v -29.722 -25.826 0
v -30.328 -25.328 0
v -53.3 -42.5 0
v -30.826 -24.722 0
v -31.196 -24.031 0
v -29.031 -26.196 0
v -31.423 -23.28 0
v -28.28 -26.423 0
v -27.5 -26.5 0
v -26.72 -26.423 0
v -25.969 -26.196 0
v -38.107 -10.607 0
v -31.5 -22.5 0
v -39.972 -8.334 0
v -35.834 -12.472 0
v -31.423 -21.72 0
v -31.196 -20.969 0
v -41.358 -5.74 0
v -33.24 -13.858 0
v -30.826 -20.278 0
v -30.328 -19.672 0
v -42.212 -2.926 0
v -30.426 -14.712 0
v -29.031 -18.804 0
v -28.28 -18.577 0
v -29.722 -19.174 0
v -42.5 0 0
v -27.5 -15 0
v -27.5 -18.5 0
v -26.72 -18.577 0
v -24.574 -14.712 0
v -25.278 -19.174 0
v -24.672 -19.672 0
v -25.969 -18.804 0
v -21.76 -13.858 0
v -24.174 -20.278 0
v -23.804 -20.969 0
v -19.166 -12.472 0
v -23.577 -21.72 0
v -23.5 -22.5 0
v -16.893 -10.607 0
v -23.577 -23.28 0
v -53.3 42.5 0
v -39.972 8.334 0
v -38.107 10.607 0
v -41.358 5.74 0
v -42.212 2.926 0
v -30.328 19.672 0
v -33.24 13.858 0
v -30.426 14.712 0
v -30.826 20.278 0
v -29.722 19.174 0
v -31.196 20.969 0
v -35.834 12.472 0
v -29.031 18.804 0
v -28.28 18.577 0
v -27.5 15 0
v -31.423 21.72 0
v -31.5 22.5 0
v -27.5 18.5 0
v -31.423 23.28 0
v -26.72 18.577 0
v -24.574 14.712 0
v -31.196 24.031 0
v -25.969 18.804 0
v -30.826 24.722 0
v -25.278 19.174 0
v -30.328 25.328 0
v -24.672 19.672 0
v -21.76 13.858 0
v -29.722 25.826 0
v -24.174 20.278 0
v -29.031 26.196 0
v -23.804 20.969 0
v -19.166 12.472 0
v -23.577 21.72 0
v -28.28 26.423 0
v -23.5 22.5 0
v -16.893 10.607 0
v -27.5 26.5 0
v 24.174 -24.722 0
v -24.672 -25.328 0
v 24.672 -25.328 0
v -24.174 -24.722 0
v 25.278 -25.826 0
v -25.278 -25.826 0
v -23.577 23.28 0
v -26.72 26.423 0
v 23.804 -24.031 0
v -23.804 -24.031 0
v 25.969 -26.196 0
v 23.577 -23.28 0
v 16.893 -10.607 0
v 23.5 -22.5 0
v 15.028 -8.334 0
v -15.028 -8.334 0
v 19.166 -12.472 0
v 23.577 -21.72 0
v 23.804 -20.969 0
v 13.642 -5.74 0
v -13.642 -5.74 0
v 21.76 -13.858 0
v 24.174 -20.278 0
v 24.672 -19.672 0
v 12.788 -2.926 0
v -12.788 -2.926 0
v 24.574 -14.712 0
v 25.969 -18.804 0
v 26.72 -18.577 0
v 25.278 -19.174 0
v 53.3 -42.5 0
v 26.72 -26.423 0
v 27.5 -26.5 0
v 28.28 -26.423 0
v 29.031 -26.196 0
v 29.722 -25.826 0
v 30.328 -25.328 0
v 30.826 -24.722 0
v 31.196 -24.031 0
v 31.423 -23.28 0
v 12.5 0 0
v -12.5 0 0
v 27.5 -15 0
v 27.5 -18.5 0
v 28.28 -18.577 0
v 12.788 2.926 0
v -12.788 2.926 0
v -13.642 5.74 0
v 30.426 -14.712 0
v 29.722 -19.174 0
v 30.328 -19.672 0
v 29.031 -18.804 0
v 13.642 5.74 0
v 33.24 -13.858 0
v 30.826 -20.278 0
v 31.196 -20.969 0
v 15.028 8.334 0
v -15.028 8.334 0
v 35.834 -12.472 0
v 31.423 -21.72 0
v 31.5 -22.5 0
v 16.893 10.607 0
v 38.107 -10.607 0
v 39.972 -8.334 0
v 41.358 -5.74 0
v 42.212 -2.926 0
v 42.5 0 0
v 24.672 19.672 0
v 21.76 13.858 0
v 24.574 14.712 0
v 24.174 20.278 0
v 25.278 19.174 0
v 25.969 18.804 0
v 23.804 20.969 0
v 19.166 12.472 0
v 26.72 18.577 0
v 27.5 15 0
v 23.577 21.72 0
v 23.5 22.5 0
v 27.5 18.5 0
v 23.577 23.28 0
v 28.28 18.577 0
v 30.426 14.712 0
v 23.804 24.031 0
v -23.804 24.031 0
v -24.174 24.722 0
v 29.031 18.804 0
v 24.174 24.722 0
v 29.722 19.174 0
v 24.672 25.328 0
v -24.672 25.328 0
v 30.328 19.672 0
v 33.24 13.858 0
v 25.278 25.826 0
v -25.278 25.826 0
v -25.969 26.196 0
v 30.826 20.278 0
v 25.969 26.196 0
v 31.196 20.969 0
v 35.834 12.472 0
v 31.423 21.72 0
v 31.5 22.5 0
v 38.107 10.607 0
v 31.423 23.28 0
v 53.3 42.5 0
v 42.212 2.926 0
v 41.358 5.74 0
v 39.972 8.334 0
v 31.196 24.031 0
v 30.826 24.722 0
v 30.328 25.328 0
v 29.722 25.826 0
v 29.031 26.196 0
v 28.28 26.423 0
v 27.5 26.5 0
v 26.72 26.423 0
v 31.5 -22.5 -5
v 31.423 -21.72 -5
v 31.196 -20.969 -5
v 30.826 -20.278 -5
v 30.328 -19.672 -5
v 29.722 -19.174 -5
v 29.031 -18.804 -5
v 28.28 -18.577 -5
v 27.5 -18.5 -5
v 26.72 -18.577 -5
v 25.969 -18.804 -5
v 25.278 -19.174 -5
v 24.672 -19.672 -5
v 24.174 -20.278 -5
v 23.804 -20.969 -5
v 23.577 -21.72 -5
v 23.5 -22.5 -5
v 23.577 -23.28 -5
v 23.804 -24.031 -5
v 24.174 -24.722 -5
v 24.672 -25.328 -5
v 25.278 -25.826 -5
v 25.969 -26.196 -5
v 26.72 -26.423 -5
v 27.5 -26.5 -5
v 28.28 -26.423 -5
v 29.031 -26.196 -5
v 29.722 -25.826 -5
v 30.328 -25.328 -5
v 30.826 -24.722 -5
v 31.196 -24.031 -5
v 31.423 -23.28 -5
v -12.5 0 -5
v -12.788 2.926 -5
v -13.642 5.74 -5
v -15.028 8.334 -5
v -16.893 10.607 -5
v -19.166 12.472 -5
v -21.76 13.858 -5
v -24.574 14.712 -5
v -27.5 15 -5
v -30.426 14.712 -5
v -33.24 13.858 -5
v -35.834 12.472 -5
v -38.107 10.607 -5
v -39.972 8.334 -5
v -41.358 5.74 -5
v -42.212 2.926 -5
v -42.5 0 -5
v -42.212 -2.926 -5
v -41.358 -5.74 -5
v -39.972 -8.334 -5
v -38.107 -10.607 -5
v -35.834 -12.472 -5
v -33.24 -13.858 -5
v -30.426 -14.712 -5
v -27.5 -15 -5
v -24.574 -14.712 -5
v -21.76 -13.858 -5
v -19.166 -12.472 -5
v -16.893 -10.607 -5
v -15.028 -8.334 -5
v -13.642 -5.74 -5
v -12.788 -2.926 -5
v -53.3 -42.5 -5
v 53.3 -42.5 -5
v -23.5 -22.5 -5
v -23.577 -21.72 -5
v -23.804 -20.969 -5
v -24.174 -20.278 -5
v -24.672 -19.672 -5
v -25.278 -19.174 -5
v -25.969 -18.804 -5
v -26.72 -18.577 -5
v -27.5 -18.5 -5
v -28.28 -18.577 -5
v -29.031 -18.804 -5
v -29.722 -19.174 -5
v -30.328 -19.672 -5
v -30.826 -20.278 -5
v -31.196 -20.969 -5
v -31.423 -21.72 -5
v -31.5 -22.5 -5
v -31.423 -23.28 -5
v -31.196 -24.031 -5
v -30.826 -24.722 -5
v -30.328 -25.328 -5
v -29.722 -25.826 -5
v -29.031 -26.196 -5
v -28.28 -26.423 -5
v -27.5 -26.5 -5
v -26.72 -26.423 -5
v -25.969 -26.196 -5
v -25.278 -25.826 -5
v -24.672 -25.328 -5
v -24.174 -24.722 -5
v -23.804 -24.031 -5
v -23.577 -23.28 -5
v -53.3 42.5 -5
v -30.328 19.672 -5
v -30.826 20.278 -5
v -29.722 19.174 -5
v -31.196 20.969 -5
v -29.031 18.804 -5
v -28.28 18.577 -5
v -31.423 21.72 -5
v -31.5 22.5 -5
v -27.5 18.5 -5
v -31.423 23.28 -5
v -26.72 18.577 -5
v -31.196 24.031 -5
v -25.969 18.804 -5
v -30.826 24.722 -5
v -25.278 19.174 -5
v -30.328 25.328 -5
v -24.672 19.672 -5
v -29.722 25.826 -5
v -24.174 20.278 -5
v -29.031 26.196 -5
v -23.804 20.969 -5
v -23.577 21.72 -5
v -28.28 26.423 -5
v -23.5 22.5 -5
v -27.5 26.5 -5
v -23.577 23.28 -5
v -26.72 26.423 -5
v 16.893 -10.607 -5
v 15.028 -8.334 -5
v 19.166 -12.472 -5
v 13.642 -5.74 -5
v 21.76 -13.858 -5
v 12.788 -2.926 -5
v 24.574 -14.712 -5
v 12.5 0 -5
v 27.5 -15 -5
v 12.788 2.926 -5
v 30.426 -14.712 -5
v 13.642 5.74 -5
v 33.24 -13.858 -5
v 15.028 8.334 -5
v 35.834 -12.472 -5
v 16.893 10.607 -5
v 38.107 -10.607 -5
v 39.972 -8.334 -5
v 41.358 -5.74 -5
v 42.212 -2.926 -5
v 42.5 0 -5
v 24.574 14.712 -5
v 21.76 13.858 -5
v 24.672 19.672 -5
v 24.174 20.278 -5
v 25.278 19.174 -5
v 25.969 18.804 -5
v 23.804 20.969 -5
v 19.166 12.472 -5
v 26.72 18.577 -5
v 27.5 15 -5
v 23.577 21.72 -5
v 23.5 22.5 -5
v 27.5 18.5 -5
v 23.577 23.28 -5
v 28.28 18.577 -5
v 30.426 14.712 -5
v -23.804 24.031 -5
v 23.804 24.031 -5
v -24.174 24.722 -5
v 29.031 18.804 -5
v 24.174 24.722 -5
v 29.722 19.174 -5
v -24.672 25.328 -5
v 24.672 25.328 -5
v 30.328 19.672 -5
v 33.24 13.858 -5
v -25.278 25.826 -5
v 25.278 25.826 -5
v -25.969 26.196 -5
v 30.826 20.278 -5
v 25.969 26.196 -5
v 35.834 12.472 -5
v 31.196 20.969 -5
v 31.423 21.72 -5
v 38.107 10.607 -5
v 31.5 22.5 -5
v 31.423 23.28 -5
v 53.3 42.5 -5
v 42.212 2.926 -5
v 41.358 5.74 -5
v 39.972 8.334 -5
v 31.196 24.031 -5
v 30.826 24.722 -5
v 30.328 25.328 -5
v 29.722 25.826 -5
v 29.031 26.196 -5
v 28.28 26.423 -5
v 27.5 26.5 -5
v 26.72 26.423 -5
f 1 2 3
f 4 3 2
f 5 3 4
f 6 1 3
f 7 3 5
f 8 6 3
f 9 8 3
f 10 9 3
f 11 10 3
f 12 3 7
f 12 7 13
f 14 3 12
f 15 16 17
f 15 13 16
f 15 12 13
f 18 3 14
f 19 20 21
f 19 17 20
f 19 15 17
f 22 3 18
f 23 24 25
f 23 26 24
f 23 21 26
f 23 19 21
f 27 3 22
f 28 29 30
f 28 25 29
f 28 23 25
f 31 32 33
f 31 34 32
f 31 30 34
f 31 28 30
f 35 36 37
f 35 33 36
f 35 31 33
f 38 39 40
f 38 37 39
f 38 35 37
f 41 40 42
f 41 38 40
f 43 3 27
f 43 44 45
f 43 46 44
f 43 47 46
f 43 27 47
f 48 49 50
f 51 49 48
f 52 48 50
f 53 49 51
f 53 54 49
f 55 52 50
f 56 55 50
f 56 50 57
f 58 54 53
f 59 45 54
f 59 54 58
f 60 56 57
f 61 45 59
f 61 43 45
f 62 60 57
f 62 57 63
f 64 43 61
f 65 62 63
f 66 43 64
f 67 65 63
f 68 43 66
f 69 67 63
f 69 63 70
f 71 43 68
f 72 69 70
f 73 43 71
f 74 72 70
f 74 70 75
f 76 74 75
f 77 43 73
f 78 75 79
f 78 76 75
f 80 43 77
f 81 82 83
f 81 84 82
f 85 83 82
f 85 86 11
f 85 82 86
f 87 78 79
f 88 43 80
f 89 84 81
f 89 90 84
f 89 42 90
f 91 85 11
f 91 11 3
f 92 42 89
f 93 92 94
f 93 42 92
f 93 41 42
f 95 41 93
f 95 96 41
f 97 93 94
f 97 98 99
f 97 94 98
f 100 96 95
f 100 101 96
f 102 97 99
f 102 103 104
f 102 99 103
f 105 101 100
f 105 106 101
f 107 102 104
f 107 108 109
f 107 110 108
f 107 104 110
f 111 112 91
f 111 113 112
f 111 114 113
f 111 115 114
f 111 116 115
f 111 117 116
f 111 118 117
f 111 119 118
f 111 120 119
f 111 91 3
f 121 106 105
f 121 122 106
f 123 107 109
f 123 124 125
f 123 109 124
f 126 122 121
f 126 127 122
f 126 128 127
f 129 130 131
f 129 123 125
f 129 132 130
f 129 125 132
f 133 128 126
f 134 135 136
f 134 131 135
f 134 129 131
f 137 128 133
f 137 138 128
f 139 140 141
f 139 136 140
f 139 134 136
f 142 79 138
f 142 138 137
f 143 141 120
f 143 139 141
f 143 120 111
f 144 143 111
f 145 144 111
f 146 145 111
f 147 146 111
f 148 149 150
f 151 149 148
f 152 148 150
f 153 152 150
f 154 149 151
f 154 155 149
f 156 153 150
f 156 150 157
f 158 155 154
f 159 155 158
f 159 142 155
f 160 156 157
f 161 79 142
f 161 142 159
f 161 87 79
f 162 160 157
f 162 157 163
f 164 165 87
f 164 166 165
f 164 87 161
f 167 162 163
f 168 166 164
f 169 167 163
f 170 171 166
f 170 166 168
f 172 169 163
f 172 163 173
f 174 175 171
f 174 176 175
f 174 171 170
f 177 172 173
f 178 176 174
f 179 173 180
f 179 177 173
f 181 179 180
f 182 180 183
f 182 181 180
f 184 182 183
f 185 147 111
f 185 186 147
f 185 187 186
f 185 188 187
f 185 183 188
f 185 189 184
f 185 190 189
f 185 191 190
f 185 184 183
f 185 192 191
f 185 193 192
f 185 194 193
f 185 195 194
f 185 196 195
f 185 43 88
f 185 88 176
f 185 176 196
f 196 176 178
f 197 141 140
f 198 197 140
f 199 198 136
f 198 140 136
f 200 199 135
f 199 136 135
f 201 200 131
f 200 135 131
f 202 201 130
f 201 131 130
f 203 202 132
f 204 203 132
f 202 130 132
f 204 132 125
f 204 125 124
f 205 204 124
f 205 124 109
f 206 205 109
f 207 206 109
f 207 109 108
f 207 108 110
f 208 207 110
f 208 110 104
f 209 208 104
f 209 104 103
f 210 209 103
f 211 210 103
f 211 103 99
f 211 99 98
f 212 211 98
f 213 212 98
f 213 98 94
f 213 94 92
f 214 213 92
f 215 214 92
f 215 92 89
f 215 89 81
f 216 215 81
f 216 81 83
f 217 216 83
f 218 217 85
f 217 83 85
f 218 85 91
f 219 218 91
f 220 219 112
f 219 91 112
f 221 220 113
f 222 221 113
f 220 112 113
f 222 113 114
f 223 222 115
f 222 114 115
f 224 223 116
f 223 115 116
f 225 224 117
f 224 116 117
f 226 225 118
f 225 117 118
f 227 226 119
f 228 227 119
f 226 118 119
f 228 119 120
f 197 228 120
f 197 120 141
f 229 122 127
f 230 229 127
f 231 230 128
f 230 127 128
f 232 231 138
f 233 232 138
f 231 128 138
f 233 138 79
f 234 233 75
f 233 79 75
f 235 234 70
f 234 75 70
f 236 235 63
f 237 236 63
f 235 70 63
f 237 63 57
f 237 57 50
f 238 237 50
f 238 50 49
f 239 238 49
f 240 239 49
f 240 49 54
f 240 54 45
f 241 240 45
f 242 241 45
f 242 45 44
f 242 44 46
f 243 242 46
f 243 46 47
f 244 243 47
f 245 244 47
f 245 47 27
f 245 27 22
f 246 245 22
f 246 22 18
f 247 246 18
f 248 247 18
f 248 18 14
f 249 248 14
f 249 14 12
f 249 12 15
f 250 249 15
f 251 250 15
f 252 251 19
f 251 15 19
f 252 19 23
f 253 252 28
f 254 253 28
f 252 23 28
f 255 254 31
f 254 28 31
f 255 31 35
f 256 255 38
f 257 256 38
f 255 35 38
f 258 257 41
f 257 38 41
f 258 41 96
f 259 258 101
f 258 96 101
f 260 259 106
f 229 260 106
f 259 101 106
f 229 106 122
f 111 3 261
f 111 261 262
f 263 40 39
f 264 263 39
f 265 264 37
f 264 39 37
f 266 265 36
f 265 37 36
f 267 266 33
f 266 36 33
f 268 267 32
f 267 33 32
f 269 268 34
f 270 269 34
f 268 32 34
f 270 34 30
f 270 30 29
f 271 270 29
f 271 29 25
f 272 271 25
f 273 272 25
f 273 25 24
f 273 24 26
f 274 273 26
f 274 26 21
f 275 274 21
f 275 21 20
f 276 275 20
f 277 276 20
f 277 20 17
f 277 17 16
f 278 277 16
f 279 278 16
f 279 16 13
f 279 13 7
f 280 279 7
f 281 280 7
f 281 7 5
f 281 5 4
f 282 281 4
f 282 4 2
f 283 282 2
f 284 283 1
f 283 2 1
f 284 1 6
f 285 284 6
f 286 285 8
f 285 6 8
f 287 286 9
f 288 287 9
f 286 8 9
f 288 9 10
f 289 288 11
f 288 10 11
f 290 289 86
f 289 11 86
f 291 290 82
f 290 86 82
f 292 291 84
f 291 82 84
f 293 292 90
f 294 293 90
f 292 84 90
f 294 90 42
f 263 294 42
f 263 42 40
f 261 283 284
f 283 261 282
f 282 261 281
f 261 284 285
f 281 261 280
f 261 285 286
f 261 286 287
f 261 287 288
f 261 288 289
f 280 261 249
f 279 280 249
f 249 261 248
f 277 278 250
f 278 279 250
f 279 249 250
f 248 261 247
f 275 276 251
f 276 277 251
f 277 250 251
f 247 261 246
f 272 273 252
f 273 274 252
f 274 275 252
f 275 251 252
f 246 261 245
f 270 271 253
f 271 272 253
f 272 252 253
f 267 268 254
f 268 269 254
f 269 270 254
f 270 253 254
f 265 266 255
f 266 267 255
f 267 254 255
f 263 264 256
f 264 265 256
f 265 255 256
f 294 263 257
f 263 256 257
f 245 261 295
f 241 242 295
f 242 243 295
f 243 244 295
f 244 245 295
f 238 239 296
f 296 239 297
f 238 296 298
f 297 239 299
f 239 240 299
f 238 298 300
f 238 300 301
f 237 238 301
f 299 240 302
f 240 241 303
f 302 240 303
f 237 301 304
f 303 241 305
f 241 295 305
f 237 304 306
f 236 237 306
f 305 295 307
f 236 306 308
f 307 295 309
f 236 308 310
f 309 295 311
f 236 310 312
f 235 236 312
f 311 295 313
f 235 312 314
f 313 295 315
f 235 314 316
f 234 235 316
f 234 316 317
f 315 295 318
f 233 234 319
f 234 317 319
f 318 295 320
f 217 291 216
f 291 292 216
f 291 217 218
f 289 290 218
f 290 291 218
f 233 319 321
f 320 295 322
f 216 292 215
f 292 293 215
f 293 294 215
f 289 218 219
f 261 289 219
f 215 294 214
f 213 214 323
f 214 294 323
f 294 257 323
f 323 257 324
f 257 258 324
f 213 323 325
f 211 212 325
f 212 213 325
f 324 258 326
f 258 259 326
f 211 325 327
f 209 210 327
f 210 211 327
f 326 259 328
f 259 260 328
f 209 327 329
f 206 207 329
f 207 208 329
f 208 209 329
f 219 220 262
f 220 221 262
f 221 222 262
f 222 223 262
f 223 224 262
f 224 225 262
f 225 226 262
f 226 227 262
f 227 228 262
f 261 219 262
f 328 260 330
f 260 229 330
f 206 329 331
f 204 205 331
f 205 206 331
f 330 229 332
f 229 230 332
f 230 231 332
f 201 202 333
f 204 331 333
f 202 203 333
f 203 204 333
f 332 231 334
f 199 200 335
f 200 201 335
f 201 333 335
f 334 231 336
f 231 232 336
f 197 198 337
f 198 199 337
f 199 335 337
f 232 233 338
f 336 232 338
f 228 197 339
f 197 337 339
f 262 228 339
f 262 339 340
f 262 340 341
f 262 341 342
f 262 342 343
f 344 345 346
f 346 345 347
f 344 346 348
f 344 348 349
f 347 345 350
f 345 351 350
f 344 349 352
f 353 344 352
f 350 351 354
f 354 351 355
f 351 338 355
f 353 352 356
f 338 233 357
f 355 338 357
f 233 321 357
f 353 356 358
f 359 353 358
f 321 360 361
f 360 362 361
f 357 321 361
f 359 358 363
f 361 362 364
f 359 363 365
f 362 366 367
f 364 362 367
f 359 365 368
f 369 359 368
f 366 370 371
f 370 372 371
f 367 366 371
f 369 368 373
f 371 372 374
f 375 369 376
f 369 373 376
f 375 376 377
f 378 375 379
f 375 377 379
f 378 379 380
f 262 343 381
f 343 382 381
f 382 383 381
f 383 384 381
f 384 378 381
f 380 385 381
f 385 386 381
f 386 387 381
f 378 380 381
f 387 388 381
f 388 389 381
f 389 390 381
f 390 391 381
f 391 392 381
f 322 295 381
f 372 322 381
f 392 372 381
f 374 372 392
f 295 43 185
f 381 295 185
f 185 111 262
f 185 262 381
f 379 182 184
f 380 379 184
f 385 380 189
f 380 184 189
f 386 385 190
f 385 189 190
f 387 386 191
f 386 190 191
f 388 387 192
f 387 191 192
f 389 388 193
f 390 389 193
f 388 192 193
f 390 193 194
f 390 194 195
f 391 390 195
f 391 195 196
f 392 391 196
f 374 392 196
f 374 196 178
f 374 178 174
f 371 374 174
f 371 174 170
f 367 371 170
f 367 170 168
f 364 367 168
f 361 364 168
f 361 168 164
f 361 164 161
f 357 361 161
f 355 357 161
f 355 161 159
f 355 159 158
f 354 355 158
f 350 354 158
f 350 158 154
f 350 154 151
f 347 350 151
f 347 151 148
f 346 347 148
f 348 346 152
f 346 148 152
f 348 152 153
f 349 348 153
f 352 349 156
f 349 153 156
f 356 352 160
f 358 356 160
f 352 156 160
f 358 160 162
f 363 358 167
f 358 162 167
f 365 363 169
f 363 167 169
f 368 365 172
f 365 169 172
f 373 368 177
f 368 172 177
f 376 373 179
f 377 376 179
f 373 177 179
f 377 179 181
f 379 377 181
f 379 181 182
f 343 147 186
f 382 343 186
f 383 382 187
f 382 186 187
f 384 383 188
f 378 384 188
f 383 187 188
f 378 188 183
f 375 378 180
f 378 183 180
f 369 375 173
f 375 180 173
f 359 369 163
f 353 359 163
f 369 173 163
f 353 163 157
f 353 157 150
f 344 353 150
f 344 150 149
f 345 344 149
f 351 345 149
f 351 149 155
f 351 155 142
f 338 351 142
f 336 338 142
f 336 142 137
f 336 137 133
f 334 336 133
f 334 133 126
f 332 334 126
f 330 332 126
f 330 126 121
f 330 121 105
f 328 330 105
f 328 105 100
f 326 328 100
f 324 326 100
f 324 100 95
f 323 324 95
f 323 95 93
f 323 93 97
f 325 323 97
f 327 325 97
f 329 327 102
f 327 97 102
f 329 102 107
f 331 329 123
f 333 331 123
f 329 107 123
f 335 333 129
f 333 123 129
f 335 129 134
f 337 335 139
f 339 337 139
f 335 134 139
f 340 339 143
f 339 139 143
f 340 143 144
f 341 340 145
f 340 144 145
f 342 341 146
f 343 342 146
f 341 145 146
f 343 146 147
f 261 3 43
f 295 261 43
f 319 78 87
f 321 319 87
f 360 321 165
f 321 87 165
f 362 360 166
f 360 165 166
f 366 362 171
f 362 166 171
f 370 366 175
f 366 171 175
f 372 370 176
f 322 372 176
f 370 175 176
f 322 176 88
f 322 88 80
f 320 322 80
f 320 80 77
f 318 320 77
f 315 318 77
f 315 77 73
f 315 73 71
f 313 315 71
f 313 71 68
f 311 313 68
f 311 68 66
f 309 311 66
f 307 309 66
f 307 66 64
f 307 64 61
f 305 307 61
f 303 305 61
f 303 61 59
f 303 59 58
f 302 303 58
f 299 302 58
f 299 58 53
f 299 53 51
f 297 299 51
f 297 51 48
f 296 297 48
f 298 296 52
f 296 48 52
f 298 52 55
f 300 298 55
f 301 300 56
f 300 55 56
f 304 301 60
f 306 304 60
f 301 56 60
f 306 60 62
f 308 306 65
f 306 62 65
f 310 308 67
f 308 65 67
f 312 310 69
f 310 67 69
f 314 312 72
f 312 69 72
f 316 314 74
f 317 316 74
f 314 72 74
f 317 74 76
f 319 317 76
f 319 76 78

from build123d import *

# Parameters (mm, degrees)
SZKIC1_W                   = 106.6
SZKIC1_H                   = 85
ODGI_CIE_BAZOWE1_DEPTH     = 5
SZKIC6_R                   = 15
SZKIC6_R_2                 = 4
WYTNIJ_WYCI_GNI_CIE1_DEPTH = 69.353054065


# Sheet-metal steps are written as plain solids
with BuildPart() as part:
    # Szkic1 → Odgięcie bazowe1 (new body)
    with BuildSketch(Plane.XY):
        Rectangle(SZKIC1_W, SZKIC1_H)
    extrude(amount=-ODGI_CIE_BAZOWE1_DEPTH)

    # Szkic6 → Wytnij-wyciągnięcie1 (cut, through all)
    with BuildSketch(Plane.XY):
        with Locations((-27.5, 0)):
            Circle(SZKIC6_R)
        with Locations((27.5, 0)):
            Circle(SZKIC6_R)
        with Locations((-27.5, 22.5)):
            Circle(SZKIC6_R_2)
        with Locations((27.5, 22.5)):
            Circle(SZKIC6_R_2)
        with Locations((27.5, -22.5)):
            Circle(SZKIC6_R_2)
        with Locations((-27.5, -22.5)):
            Circle(SZKIC6_R_2)
    extrude(amount=-WYTNIJ_WYCI_GNI_CIE1_DEPTH, mode=Mode.SUBTRACT)


solid = part.part
